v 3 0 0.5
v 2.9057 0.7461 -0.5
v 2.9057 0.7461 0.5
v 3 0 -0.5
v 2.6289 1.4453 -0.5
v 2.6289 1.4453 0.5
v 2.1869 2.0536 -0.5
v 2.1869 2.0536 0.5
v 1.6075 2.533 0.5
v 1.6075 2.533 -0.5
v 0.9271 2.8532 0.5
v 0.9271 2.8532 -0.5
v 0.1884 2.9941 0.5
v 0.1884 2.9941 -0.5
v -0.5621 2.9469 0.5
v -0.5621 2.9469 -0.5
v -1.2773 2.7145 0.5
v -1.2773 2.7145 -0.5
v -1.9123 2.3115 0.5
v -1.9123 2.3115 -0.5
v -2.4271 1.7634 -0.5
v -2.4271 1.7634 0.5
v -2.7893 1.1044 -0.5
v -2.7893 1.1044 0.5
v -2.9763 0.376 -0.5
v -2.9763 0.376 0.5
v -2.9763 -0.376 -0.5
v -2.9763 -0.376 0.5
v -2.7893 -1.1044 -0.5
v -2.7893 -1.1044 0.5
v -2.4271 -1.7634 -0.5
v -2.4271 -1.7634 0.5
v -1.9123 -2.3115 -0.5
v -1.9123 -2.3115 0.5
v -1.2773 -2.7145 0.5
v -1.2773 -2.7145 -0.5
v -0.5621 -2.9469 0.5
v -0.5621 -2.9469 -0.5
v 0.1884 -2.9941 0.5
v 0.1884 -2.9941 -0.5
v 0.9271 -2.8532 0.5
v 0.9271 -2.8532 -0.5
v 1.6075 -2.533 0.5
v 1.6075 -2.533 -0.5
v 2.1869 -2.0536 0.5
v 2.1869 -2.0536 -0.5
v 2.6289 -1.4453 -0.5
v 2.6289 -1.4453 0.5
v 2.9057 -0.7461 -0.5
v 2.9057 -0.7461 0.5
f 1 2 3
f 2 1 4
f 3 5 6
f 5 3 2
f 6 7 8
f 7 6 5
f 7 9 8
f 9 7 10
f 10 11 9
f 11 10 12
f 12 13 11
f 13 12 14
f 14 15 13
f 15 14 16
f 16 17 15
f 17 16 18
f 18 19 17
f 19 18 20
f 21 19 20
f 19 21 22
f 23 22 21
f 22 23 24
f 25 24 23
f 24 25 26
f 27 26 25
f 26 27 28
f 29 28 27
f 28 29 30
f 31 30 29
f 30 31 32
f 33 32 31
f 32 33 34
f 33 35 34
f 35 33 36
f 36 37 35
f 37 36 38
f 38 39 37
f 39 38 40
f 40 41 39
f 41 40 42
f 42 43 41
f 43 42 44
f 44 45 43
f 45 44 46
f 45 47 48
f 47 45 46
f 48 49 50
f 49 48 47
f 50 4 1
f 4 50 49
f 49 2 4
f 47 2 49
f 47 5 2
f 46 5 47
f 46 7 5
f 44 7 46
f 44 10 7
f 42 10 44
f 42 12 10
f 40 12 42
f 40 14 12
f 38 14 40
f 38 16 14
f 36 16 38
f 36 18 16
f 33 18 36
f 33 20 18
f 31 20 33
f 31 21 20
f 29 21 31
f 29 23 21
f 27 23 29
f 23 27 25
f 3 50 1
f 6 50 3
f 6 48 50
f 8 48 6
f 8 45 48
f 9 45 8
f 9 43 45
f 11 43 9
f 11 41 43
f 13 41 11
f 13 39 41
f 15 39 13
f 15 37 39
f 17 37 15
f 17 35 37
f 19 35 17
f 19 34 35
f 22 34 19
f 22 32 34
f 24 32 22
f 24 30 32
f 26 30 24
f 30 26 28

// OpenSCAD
cap_dia = 6;
cap_height = 1;

cylinder(d = cap_dia, h = cap_height, $fn = 25, center = true);
